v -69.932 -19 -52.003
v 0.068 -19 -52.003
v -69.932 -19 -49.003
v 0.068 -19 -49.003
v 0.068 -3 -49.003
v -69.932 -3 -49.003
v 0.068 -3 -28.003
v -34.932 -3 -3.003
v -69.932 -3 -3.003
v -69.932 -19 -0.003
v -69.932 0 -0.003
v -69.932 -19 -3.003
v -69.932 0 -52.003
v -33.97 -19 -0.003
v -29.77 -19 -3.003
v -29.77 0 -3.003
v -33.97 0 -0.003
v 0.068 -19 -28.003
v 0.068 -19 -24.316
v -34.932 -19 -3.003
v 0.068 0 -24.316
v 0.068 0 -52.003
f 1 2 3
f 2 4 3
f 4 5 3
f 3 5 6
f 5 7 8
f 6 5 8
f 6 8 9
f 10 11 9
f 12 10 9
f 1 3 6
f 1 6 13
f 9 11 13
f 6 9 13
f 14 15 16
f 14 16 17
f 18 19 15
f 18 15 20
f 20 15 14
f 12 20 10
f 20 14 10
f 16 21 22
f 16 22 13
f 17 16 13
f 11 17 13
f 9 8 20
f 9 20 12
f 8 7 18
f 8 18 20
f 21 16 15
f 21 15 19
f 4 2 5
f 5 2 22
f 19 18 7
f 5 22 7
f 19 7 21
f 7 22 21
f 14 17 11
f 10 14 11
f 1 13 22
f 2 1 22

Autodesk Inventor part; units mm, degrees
ref_plane "YZ Plane" through (0, 0, 0) normal (1, 0, 0) x (0, 1, 0)
ref_plane "XZ Plane" through (0, 0, 0) normal (0, 1, 0) x (-1, 0, 0)
ref_plane "XY Plane" through (0, 0, 0) normal (0, 0, 1) x (1, 0, 0)
sketch "Sketch1" plane through (0, 0, 0) normal (0, 1, 0) x (-1, 0, 0)
  line L0 (33.9701, -0.003) -> (69.9315, -0.003)
  line L1 (69.9315, -0.003) -> (69.9315, -52.003)
  line L2 (69.9315, -52.003) -> (-0.0685, -52.003)
  line L3 (-0.0685, -49.003) -> (69.9315, -49.003)
  line L4 (34.9315, -3.003) -> (69.9315, -3.003)
  line L5 (-0.0685, -28.003) -> (34.9315, -3.003)
  line L6 (29.7701, -3.003) -> (-0.0685, -24.3163)
  line L7 (-0.0685, -52.003) -> (-0.0685, -24.3163)
  line L8 (29.7701, -3.003) -> (33.9701, -0.003)
  point P0 (0, 0)
  dimension "d0" = 70
  dimension "d1" = 52
  dimension "d2" = 3
  dimension "d3" = 3
  dimension "d4" = 3
  dimension "d5" = 21
extrude "Extrusion1" add sketch "Sketch1" against normal blind 19 contours L0 L1 L4 L5 L7 L6 L8 | L1 L2 L7 L3
extrude "Extrusion2" add sketch "Sketch1" against normal blind 3 contours L1 L3 L7 L5 L4
properties part number "Cooling Fan Shroud"
